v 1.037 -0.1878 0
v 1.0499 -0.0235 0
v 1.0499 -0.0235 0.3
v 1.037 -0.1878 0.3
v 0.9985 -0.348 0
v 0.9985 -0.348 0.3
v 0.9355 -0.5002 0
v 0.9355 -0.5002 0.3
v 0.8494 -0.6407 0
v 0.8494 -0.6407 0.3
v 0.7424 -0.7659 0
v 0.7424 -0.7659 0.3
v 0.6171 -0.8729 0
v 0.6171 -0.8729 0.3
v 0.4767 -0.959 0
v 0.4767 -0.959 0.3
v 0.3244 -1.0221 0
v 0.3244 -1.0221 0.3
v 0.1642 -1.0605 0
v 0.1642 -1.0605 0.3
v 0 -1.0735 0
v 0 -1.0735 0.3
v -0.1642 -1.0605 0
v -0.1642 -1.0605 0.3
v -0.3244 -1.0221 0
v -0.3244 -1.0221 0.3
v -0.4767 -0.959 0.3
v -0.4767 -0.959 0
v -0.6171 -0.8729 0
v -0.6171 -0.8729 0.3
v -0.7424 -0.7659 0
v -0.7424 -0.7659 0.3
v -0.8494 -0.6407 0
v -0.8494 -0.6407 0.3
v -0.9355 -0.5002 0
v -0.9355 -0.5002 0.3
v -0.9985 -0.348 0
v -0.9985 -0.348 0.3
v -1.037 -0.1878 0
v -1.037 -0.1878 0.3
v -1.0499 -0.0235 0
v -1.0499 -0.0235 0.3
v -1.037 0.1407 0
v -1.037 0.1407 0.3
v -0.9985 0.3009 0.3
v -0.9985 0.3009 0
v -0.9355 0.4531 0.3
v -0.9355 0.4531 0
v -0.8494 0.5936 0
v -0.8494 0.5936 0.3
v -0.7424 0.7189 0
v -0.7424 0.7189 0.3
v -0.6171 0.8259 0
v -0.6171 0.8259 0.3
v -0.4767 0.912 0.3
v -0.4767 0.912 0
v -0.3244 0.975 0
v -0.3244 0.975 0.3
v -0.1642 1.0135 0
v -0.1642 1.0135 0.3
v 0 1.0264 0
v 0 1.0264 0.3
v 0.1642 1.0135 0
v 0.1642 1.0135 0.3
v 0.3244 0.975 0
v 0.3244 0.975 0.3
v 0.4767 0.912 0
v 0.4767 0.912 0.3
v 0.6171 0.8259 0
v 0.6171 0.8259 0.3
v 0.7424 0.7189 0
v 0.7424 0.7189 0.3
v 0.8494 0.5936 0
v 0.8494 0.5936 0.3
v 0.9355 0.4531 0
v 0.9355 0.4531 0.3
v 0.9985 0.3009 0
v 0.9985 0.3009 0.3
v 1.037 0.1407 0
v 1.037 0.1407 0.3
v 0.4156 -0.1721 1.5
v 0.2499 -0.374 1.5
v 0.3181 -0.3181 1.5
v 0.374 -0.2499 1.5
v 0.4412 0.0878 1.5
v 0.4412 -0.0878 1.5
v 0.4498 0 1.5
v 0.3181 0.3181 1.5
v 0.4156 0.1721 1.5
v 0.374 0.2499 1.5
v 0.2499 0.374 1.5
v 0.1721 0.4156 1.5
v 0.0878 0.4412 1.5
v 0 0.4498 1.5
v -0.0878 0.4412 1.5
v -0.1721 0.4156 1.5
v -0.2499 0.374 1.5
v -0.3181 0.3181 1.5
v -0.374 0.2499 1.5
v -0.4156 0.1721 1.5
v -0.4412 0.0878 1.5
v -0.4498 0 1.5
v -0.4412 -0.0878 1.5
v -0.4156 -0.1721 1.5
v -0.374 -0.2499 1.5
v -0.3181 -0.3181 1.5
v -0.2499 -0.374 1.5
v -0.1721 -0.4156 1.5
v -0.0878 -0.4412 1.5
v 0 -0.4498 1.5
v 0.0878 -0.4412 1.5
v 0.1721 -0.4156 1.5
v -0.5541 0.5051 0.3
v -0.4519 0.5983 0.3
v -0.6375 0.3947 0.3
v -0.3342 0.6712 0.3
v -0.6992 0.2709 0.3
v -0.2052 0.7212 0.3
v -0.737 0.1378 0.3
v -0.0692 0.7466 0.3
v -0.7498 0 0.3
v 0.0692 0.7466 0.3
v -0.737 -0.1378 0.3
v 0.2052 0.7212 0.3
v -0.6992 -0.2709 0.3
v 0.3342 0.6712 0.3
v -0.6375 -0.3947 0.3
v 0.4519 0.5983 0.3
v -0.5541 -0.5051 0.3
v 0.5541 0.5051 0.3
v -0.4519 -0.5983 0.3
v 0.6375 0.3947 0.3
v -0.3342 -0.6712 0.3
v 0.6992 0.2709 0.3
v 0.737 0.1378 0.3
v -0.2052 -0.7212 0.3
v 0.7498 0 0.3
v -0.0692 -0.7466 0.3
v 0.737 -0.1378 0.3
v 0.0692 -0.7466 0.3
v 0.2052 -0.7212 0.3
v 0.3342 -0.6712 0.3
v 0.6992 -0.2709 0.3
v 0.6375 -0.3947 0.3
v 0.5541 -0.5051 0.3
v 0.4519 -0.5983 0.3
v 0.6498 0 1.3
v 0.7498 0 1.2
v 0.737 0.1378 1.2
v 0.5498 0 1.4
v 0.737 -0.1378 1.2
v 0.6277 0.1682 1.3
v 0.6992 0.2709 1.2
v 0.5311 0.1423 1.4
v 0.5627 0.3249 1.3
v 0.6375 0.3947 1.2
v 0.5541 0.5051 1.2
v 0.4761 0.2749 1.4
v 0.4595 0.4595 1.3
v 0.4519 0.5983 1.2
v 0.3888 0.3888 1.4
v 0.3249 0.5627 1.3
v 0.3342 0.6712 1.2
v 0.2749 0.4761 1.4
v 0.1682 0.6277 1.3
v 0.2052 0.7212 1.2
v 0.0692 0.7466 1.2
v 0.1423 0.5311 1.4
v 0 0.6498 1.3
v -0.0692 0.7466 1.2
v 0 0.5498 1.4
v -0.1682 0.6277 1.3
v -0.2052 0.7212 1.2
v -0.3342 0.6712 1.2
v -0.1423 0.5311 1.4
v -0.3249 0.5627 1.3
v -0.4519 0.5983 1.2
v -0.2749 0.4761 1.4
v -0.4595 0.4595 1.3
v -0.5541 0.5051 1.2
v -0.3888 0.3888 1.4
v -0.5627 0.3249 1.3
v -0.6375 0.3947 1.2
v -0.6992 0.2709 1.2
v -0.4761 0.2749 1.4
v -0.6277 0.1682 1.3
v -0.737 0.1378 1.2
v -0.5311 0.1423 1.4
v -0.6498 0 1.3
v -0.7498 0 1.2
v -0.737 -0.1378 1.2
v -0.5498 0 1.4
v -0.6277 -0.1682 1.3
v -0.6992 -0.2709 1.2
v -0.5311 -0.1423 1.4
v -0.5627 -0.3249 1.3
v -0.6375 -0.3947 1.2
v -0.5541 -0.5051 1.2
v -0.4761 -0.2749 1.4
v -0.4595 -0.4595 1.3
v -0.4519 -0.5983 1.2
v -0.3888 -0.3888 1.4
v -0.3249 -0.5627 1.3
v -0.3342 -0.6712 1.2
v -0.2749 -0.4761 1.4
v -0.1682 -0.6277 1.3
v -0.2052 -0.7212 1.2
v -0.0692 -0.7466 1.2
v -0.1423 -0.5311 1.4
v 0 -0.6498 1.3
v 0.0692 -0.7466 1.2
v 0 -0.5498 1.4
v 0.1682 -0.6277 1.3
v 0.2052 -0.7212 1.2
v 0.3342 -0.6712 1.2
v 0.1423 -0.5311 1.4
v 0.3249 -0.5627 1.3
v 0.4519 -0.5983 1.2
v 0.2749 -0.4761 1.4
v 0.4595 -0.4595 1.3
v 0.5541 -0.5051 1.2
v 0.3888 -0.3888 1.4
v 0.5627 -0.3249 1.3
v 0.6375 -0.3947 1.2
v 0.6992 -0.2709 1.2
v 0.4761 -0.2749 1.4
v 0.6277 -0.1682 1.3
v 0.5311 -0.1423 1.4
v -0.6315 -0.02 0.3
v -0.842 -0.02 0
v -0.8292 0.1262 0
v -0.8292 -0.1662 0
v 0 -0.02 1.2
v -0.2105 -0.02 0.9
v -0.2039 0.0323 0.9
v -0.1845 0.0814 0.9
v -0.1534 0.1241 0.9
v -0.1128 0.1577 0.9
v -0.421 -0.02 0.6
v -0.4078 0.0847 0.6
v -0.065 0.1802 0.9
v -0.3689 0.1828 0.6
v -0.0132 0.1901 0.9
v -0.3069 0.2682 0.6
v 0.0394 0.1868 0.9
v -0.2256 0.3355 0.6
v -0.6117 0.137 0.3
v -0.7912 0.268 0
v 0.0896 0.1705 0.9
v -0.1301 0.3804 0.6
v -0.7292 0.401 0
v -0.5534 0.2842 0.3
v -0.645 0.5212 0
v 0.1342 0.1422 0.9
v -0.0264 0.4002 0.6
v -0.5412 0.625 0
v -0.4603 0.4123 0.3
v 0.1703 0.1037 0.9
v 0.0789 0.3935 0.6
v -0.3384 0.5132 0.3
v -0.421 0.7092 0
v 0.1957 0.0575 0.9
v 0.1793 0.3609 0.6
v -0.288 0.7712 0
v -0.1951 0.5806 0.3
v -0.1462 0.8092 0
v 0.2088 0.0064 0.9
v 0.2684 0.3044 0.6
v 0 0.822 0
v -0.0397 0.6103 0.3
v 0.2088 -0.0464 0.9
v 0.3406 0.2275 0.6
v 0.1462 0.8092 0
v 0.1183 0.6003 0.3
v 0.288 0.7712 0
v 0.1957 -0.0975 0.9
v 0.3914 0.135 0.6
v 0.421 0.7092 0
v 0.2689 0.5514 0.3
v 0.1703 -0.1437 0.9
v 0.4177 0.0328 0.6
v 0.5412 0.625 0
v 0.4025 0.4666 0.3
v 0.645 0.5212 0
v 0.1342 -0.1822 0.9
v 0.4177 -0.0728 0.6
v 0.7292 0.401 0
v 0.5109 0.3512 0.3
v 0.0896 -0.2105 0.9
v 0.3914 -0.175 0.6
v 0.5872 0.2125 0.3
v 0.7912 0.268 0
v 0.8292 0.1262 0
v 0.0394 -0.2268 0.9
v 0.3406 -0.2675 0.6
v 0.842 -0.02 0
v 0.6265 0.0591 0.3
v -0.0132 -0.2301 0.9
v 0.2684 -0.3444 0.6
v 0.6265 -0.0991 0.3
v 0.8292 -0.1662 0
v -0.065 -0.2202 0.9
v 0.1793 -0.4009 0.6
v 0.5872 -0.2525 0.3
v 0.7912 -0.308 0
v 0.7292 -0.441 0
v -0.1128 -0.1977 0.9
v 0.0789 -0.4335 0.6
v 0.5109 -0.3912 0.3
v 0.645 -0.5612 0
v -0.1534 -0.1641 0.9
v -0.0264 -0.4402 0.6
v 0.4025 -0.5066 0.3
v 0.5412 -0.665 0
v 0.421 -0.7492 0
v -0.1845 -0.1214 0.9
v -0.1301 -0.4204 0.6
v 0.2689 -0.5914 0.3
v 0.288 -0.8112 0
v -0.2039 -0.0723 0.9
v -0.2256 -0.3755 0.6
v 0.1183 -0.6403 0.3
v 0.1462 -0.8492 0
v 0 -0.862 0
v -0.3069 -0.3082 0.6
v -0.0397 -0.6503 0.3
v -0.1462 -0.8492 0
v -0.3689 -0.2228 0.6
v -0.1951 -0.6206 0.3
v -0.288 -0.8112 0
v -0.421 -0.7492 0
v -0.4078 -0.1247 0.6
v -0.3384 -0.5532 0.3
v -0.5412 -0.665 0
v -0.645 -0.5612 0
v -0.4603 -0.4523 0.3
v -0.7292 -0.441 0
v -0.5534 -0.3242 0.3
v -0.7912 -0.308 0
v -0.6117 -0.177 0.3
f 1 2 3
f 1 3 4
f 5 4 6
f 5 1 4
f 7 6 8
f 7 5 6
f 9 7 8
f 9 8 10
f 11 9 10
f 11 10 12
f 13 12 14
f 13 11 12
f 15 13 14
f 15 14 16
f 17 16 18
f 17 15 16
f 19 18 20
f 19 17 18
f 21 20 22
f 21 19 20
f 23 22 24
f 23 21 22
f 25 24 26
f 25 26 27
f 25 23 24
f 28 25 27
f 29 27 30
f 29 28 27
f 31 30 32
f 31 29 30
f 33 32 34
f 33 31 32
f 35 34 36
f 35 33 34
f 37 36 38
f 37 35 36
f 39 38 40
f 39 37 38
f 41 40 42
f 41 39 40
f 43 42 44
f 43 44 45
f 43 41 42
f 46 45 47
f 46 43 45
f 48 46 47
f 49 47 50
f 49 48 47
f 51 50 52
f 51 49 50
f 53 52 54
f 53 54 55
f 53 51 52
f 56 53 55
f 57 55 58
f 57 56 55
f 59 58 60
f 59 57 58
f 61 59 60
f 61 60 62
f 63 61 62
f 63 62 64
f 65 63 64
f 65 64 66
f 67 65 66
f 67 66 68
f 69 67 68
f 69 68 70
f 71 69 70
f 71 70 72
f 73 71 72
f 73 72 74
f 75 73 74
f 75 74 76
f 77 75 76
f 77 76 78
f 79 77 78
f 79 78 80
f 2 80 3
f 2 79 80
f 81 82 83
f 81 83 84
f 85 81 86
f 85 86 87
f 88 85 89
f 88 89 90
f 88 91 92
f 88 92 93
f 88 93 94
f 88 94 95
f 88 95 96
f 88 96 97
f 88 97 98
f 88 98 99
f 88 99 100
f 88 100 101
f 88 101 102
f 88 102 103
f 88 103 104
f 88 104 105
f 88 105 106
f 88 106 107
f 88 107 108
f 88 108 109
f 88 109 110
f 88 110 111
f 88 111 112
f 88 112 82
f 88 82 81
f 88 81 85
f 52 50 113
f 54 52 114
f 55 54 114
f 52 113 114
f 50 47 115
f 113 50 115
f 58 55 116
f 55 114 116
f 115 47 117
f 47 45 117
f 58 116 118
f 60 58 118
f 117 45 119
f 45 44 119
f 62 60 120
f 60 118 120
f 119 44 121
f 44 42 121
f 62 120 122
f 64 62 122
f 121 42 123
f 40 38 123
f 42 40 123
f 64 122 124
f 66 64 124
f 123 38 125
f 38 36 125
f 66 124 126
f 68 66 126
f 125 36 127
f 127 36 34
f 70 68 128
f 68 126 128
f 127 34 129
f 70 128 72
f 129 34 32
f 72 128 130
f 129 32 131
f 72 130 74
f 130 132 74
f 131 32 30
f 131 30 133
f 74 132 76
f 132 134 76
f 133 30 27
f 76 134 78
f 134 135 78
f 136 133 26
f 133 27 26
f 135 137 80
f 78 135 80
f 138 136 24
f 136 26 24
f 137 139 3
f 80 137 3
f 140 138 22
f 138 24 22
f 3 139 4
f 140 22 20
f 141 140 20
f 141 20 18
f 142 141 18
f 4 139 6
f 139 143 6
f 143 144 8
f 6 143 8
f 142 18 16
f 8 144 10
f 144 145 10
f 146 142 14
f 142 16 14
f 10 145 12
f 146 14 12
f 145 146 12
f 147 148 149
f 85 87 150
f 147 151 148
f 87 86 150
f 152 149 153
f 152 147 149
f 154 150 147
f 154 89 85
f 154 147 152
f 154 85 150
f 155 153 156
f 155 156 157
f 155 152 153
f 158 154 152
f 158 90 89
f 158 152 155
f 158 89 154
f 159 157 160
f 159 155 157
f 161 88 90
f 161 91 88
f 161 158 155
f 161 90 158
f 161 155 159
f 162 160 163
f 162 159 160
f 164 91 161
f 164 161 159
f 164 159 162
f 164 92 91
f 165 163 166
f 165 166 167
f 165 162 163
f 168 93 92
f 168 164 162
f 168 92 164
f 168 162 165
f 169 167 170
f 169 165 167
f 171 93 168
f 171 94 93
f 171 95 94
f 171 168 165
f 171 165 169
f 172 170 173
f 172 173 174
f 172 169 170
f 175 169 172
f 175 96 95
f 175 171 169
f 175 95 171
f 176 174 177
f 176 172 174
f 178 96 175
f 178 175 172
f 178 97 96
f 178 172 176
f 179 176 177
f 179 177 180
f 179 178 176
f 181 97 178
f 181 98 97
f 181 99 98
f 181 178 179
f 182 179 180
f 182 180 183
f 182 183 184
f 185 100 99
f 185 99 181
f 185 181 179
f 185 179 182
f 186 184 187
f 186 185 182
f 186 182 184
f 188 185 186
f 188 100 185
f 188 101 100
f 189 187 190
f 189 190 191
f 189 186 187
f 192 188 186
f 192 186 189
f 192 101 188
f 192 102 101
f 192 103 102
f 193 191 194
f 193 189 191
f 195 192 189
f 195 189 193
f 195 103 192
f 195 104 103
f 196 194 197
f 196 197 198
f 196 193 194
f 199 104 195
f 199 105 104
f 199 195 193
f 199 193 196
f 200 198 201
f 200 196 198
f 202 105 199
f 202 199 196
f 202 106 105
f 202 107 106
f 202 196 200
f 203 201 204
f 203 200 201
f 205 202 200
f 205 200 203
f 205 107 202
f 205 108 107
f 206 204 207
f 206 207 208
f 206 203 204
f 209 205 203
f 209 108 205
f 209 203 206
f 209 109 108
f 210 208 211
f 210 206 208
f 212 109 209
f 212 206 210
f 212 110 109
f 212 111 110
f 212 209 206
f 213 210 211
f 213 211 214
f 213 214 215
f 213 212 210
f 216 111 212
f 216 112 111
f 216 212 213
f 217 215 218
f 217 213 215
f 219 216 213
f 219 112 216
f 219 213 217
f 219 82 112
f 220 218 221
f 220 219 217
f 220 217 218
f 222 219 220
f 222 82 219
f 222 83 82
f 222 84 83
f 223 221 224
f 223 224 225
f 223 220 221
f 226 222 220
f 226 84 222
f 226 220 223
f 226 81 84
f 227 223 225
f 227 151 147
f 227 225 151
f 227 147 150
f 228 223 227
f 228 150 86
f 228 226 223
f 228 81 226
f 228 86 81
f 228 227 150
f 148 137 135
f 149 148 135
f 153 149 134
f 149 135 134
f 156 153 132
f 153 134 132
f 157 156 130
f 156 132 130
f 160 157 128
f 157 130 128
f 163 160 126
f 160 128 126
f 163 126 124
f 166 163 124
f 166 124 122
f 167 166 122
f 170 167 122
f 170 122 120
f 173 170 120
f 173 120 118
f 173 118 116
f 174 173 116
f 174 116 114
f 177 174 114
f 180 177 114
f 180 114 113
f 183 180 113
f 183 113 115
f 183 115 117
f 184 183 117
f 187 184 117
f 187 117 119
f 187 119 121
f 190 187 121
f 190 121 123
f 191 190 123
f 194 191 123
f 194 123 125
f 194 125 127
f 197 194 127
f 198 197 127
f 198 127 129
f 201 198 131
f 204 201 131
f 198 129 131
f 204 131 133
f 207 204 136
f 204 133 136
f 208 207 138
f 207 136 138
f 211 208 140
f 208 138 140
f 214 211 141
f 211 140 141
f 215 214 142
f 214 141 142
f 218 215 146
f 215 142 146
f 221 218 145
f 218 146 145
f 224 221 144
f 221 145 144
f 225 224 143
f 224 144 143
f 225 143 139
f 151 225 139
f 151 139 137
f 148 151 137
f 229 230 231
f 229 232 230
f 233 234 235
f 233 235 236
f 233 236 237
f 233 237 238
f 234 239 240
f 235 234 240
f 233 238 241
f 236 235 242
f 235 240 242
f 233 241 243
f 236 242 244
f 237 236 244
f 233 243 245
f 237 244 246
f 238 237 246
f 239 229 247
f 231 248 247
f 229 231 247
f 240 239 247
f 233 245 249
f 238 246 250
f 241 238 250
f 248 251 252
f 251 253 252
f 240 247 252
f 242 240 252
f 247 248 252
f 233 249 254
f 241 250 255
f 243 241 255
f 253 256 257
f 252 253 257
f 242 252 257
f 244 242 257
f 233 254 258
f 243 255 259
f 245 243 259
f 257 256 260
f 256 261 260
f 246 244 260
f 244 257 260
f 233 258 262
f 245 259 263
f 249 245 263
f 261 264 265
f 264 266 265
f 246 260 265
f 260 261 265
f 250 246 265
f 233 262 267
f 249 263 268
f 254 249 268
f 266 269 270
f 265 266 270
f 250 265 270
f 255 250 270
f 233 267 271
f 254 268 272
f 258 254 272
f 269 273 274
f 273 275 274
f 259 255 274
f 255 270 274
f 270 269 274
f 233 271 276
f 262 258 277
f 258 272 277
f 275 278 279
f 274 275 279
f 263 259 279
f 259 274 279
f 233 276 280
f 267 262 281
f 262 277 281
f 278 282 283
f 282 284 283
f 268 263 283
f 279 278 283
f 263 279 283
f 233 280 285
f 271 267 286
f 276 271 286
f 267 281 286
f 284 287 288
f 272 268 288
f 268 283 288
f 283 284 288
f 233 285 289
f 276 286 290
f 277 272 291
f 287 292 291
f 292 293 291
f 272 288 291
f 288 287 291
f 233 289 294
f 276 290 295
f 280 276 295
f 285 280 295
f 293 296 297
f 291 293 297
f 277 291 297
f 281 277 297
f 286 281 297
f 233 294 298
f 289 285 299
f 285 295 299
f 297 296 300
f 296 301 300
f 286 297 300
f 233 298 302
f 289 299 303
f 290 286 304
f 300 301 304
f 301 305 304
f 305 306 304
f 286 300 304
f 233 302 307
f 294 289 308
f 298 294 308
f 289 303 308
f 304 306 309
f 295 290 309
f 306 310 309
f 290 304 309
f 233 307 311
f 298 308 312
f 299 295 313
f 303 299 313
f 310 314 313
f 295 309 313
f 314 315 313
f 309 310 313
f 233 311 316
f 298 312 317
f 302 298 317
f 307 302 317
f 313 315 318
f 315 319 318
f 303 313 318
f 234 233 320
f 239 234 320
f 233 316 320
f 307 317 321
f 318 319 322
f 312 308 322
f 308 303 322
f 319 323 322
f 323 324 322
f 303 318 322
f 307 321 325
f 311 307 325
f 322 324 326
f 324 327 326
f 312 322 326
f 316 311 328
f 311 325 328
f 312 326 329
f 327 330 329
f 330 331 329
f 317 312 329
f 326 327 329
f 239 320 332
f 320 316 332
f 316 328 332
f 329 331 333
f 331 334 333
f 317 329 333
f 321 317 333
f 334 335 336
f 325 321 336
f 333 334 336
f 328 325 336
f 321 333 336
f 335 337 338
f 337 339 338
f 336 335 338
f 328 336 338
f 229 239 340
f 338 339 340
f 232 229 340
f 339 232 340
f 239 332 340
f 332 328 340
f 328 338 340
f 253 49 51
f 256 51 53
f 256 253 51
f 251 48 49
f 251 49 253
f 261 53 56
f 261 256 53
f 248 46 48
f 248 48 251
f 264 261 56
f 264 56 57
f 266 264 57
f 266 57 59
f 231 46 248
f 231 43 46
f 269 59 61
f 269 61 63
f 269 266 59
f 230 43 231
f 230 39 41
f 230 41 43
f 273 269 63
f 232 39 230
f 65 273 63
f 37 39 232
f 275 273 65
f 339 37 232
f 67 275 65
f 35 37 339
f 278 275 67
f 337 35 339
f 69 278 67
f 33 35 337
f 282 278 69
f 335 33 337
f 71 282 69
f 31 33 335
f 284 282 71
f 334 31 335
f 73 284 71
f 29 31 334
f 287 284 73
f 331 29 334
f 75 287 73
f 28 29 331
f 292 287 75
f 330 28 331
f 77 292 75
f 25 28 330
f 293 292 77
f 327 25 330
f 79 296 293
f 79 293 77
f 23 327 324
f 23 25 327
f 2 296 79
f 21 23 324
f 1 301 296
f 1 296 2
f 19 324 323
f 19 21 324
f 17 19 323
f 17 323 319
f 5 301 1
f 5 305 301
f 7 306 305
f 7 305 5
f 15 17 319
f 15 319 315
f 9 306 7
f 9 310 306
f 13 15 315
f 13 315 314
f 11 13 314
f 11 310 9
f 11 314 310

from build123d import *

# Parameters (mm, degrees)
F0_R     = 0.7497944492
F1_DEPTH = 1.2
F2_R     = 1.0499303661
F2_R_2   = 0.7497944492
F3_DEPTH = 0.3
F4_DEPTH = 0.3
F5_SIZE  = 0.3


with BuildPart() as f1:
    # F0 (on Top) → F1 (new body)
    with BuildSketch(Plane.XY):
        Circle(F0_R)
    extrude(amount=F1_DEPTH)

    # F2 (on face) → F3 (join)
    with BuildSketch(Plane(origin=(0, 0, 0), x_dir=(1, 0, 0), z_dir=(0, 0, -1))):
        with Locations((0, 0.0235324333)):
            Circle(F2_R)
        Circle(F2_R_2, mode=Mode.SUBTRACT)
    extrude(amount=-F3_DEPTH)

    # F4 (add): a face of the model
    f4_faces = [f1.faces().sort_by_distance(p)[0] for p in [
        (0, 0, 1.2),
    ]]
    extrude(f4_faces, amount=F4_DEPTH)

    # F5
    f5_edges = [f1.edges().sort_by_distance(p)[0] for p in [
        (-0.749794, 0, 1.5),
    ]]
    chamfer(f5_edges, length=F5_SIZE)


with BuildPart() as f7:
    # F6 (on Front) → F7 (revolve)
    with BuildSketch(Plane.XZ):
        Polygon((0, -1.2119101593), (0, 0), (-0.8503605495, -1.2119101593), align=None)
    revolve(axis=Axis((0, 0, -0.6059550797), (0, 0, -1)))


with BuildPart() as f7_1:
    # F8: moved
    add(f7.part.moved(Location((0, 0, 1))))


with BuildPart() as f7_2:
    # F9: moved
    add(f7_1.part.moved(Location((0, 0, 0.2))))


with BuildPart() as f7_3:
    # F10: moved
    add(f7_2.part.moved(Location((0, -0.02, 0))))


with BuildPart() as f1_1:
    add(f1.part)

    # F11: cut F7
    add(f7_3.part, mode=Mode.SUBTRACT)


solid = f1_1.part
